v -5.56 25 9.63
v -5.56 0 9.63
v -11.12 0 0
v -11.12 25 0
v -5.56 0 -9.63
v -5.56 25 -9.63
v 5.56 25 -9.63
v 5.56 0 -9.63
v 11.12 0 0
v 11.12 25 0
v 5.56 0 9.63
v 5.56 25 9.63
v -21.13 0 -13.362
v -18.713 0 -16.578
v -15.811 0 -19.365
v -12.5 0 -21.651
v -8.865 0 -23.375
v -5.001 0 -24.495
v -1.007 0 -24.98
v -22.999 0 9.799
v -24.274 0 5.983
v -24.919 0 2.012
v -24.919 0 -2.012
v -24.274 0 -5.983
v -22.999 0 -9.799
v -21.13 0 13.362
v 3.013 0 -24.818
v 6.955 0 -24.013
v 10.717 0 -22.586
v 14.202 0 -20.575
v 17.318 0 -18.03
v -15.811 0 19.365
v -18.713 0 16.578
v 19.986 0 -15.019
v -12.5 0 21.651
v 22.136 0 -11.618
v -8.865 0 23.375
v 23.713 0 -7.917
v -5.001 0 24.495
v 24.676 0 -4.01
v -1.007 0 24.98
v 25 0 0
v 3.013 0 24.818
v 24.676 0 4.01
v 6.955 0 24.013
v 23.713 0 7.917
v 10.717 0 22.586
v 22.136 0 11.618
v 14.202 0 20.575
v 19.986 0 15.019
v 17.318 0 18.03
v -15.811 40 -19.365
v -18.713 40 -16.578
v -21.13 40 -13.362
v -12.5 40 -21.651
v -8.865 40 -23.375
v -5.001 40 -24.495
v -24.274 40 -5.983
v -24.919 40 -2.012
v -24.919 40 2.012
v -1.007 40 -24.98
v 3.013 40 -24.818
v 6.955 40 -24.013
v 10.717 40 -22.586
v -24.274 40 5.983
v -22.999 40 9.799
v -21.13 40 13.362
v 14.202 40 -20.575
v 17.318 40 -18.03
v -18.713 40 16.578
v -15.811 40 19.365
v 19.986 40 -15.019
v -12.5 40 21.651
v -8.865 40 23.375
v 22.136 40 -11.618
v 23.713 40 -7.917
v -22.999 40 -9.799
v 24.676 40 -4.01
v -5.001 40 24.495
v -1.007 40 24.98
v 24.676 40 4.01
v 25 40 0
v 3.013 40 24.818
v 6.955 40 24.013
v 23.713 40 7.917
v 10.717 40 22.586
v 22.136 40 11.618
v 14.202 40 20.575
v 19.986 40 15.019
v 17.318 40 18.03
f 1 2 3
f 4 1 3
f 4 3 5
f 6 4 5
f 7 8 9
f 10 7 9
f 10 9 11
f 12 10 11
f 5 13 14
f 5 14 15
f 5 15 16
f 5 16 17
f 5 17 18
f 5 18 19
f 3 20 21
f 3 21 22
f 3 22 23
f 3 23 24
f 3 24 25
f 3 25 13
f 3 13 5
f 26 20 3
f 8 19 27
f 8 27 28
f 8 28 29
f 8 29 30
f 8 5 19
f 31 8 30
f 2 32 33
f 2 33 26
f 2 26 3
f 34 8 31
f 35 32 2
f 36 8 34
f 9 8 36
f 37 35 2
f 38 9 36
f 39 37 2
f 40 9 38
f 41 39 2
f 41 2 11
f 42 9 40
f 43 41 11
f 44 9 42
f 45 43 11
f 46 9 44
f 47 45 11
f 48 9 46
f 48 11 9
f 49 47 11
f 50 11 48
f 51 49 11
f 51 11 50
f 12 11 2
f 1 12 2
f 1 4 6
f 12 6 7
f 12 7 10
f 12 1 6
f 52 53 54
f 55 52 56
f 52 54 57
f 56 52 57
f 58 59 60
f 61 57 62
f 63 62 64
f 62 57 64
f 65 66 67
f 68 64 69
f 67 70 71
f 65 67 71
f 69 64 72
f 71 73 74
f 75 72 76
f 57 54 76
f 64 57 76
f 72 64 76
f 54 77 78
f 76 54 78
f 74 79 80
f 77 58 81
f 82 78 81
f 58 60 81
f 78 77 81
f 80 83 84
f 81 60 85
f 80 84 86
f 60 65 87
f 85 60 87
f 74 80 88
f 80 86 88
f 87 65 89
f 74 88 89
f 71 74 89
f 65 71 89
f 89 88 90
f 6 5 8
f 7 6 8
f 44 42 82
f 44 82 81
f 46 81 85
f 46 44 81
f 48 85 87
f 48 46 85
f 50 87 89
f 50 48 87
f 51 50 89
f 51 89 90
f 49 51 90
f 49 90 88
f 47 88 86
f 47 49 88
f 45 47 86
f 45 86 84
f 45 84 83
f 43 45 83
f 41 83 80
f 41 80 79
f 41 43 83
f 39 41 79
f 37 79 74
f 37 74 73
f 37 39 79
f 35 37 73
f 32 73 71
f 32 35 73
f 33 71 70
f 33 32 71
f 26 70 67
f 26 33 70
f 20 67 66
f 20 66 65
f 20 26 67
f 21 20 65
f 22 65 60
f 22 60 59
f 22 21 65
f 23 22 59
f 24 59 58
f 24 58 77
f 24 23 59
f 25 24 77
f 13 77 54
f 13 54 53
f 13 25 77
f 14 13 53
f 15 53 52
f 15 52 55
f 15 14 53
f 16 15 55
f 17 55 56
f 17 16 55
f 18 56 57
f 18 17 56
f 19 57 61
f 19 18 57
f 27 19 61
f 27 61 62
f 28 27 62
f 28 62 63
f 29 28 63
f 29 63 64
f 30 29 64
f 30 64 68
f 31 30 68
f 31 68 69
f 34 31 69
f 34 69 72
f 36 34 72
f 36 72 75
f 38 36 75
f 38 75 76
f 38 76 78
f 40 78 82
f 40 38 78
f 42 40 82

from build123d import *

# Parameters (mm, degrees)
F0_R     = 25
F1_DEPTH = 40
F3_DEPTH = 25


with BuildPart() as f1:
    # F0 (on Front) → F1 (new body)
    with BuildSketch(Plane.XZ):
        Circle(F0_R)
    extrude(amount=-F1_DEPTH)

    # F2 (on Front) → F3 (cut)
    with BuildSketch(Plane.XZ):
        Polygon((5.559986, 9.630178), (-5.559986, 9.630178), (-11.119972, 0), (-5.559986, -9.630178), (5.559986, -9.630178), (11.119972, 0), align=None)
    extrude(amount=-F3_DEPTH, mode=Mode.SUBTRACT)


solid = f1.part
